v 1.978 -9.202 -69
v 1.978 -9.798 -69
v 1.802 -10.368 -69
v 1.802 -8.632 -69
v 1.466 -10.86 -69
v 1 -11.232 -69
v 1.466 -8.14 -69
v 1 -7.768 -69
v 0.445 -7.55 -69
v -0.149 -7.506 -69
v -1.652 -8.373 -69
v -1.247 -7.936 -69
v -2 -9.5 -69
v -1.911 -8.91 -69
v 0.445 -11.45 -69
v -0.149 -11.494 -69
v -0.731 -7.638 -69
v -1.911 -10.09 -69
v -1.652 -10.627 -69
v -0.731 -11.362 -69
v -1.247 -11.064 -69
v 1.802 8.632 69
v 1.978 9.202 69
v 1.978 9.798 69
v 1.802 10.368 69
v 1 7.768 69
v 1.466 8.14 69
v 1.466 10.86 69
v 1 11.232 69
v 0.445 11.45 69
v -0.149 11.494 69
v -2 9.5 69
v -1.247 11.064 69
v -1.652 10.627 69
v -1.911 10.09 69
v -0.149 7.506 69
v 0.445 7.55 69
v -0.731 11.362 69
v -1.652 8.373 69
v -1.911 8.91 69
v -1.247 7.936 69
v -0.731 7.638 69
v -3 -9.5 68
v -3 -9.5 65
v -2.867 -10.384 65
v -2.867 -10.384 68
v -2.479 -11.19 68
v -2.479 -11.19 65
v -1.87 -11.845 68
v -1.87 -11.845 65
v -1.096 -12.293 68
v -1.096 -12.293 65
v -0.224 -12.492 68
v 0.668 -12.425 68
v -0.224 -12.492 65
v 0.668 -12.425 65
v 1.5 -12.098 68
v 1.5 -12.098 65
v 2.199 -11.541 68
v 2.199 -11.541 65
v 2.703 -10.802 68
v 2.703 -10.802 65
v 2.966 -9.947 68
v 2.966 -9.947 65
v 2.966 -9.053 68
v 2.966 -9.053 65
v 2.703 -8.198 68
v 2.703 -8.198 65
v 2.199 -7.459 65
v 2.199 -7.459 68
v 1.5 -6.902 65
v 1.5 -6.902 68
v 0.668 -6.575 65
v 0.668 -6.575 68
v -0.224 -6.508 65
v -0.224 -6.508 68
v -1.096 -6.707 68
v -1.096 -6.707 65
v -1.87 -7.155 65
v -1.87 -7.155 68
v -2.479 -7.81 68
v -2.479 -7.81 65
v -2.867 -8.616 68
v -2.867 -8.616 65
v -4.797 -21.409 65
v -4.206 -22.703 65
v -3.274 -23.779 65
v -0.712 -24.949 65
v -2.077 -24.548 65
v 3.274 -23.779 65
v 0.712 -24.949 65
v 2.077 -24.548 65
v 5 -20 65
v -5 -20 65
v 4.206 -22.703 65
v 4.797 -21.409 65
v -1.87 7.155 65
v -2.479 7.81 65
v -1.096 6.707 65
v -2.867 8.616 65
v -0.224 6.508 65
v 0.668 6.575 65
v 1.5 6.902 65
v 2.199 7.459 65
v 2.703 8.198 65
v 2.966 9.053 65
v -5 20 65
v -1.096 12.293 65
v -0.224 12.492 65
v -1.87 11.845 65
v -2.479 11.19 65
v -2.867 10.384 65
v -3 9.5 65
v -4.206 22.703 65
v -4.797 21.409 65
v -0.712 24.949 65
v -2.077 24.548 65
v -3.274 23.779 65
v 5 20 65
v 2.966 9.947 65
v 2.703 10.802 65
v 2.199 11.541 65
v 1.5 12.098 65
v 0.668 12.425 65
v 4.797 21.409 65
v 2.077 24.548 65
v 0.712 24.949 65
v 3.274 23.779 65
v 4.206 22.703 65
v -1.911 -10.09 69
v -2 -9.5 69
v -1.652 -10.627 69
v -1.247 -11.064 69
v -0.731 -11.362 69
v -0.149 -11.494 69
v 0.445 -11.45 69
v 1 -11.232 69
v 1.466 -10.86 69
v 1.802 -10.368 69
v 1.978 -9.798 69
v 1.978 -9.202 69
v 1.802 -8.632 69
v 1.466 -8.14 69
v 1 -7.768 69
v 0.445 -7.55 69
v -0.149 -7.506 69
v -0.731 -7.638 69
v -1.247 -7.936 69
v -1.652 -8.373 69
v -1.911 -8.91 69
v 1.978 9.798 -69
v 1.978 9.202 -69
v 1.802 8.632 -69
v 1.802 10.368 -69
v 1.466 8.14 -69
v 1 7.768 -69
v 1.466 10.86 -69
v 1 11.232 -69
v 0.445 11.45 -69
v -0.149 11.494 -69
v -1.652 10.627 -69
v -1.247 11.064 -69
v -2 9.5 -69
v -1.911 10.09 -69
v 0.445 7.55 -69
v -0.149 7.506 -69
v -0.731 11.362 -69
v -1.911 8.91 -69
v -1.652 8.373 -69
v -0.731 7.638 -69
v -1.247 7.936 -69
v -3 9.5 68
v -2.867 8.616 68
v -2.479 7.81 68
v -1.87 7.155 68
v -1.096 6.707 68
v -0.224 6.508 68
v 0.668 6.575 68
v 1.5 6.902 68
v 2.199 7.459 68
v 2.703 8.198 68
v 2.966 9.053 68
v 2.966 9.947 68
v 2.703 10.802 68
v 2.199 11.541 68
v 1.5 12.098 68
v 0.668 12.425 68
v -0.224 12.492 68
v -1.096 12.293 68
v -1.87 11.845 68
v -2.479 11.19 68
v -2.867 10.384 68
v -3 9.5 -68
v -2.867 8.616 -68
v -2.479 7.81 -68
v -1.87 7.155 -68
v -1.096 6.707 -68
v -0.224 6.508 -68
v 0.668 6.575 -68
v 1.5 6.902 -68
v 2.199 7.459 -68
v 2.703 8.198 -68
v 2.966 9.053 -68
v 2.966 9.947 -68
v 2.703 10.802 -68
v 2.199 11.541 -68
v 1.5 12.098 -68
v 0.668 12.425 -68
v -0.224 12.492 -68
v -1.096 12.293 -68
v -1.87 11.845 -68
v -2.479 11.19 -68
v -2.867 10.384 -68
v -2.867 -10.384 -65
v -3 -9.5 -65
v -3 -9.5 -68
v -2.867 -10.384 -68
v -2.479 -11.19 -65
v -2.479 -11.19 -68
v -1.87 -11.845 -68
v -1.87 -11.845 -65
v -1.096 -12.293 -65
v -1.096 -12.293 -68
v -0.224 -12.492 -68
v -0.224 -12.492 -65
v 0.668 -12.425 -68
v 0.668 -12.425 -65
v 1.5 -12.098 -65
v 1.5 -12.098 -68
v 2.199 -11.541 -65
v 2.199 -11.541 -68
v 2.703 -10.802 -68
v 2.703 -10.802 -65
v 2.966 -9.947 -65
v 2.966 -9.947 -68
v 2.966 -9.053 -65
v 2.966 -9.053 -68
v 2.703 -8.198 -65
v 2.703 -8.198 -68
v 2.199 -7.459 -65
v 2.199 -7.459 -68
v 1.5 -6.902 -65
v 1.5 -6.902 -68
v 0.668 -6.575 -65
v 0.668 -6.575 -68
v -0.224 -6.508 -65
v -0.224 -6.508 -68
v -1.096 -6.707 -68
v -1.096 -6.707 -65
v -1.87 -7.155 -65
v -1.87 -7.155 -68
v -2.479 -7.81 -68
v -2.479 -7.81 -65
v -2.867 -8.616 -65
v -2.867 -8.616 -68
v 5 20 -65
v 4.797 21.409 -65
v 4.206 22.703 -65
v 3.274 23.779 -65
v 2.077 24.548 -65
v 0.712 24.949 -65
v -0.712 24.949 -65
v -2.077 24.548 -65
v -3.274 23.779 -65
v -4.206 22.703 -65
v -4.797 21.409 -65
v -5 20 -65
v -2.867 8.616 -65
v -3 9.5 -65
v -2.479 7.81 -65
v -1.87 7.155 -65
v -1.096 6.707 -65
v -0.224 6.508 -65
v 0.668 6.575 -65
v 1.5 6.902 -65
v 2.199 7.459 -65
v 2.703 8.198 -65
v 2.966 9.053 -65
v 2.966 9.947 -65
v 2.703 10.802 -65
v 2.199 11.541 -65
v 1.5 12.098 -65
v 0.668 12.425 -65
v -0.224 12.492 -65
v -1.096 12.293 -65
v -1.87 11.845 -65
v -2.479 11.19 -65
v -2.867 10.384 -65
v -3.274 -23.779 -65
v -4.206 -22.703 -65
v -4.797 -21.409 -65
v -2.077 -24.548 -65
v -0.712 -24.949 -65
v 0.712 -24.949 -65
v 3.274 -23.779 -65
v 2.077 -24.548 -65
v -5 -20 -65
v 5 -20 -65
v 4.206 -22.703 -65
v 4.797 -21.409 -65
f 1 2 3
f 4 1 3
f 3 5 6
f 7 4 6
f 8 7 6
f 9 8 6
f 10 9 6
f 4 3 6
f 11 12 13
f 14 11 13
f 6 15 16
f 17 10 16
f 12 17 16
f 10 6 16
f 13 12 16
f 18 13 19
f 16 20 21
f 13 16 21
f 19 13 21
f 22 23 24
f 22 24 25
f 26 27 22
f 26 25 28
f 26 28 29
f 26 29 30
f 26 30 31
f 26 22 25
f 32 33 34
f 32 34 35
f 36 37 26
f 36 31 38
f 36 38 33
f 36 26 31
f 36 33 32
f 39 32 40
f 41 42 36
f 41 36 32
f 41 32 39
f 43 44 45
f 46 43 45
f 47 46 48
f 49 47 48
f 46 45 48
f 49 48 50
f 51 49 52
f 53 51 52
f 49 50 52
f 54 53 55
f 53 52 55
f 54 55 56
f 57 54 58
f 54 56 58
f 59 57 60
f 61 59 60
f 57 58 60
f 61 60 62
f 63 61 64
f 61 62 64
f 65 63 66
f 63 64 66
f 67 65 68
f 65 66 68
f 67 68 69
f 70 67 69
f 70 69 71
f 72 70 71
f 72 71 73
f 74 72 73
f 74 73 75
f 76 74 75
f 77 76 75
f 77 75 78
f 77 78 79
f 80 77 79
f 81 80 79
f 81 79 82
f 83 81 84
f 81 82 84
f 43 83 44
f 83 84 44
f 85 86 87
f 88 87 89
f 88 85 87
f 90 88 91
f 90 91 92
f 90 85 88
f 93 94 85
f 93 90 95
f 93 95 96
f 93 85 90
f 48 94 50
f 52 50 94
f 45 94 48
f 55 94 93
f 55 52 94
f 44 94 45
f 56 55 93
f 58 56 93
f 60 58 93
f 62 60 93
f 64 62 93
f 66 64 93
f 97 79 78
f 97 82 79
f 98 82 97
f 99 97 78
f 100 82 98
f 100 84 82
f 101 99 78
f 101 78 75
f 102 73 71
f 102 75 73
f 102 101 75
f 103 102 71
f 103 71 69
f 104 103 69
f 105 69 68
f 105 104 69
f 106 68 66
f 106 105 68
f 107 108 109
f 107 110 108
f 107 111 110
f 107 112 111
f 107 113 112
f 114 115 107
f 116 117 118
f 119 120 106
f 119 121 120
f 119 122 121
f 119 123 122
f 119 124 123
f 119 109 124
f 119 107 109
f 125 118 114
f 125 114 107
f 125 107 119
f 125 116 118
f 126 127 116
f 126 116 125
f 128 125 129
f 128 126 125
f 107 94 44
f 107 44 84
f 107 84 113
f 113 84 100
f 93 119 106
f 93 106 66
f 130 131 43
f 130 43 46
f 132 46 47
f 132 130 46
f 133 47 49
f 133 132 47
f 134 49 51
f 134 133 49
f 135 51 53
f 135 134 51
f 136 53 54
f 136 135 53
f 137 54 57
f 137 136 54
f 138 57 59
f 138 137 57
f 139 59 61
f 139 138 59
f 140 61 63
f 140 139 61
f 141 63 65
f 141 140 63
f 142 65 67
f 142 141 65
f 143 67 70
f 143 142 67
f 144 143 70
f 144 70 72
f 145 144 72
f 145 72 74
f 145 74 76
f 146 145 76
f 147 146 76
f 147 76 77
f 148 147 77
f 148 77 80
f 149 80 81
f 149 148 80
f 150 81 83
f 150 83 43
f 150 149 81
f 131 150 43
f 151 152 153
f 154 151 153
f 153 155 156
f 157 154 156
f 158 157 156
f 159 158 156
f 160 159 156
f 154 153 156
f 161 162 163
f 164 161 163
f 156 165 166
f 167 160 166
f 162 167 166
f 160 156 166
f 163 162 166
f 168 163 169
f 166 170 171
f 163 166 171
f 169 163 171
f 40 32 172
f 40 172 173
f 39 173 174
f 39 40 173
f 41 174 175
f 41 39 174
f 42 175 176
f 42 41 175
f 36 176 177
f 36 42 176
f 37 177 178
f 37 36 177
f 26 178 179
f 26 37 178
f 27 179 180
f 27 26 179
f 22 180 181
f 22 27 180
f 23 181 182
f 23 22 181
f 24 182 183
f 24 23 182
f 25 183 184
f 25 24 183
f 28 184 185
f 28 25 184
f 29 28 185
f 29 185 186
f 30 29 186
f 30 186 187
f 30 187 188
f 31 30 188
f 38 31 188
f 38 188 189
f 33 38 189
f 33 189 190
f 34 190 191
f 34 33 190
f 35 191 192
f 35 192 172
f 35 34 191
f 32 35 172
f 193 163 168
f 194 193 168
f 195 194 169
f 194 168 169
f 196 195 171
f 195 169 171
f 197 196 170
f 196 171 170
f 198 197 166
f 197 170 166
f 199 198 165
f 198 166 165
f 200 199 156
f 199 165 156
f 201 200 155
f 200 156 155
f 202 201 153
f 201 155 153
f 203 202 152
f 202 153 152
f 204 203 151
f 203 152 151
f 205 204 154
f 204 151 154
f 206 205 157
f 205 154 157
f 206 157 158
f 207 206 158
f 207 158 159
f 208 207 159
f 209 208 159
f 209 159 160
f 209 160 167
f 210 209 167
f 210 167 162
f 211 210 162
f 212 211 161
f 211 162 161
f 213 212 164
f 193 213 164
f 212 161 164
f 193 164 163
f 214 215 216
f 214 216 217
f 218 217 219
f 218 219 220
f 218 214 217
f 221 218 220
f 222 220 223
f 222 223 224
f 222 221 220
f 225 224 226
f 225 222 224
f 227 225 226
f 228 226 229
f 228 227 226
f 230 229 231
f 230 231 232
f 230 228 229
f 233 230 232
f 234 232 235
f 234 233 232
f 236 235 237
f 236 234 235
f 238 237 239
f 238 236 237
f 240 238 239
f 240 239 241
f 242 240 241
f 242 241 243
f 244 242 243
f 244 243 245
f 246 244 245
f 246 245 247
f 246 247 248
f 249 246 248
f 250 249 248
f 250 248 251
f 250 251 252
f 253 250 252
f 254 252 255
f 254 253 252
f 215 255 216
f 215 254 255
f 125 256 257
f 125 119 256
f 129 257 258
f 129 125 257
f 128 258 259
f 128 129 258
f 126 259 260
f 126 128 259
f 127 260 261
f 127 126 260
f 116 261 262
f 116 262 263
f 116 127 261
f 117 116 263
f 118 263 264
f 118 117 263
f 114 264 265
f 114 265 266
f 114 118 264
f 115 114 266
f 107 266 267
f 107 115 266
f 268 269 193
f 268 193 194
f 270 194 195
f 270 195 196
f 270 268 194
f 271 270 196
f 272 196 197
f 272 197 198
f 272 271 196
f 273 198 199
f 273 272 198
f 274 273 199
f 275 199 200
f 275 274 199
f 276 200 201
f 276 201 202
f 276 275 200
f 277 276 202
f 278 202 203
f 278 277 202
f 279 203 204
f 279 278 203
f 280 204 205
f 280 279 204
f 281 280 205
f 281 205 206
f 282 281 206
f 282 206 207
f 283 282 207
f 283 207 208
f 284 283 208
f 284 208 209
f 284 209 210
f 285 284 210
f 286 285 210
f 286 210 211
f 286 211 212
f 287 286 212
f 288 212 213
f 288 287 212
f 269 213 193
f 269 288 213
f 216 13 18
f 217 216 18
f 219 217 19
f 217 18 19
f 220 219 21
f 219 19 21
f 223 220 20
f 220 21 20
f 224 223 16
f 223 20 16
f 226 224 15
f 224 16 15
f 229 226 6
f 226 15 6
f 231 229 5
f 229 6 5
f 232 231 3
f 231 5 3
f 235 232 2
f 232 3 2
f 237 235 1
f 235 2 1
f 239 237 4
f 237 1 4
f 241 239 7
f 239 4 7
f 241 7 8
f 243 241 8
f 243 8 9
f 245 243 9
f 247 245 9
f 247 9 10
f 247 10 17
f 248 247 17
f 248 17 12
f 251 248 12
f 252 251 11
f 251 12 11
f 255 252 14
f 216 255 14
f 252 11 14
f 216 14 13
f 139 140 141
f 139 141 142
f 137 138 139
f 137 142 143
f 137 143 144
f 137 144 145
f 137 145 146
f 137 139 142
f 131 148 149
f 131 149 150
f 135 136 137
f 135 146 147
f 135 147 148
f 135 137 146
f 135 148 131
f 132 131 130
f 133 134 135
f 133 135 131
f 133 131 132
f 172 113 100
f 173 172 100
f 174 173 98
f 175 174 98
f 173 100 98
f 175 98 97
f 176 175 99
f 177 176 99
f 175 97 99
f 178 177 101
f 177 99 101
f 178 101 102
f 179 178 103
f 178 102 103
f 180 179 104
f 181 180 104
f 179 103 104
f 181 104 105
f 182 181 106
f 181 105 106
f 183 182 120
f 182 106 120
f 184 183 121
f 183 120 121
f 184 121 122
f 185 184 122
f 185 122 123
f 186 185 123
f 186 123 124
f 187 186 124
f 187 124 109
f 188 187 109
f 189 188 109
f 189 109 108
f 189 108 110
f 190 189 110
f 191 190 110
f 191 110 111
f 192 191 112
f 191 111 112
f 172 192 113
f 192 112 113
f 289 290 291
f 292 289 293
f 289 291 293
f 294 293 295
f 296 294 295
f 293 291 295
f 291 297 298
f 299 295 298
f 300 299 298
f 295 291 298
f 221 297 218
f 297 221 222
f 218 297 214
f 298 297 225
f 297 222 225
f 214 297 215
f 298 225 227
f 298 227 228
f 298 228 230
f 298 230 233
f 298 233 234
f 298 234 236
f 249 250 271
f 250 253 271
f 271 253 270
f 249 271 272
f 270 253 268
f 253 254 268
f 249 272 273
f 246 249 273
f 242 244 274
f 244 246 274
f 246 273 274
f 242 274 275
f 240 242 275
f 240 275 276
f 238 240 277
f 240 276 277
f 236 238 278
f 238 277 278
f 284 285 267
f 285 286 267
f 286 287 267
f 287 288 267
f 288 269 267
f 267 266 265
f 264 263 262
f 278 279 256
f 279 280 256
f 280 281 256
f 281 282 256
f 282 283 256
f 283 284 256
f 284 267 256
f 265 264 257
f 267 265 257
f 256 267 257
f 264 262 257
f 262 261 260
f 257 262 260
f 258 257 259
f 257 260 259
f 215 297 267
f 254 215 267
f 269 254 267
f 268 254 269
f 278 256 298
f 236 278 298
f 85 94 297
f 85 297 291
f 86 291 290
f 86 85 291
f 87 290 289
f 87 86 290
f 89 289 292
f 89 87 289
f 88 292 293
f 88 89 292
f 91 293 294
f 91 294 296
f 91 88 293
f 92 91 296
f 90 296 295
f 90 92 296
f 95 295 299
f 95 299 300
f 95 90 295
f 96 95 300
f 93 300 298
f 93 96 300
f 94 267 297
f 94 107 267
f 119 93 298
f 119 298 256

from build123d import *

# Parameters (mm, degrees)
EXTRUDE_1_DEPTH            = 65
SKETCH_2_R                 = 3
EXTRUDE_2_DEPTH            = 4
CHAMFER_1_SIZE             = 1
CHAMFER_1_OF_MIRROR_1_SIZE = 1


with BuildPart() as part:
    # 草圖1 → 伸長1 (new, symmetric)
    with BuildSketch(Plane.XY):
        with BuildLine():
            Line((-5, 20), (-5, -20))
            ThreePointArc((-5, -20), (0, -25), (5, -20))
            Line((5, -20), (5, 20))
            ThreePointArc((5, 20), (0, 25), (-5, 20))
        make_face()
    extrude(amount=EXTRUDE_1_DEPTH, both=True)

    # 草圖2 → 伸長2 (add)
    with BuildSketch(Plane.XY.offset(65)):
        with Locations(Location((0, 9.5, 0), (0, 0, 180))):
            Circle(SKETCH_2_R)
        with Locations(Location((0, -9.5, 0), (0, 0, 180))):
            Circle(SKETCH_2_R)
    extrude_2 = extrude(amount=EXTRUDE_2_DEPTH)

    # 導角1
    chamfer_1_edges = [part.edges().sort_by_distance(p)[0] for p in [
        (3, 9.5, 69),
        (3, -9.5, 69),
    ]]
    chamfer(chamfer_1_edges, length=CHAMFER_1_SIZE)

    # 鏡射1: 伸長2 across plane
    add(extrude_2.mirror(Plane.XY))

    # 導角1 of 鏡射1
    chamfer_1_of_mirror_1_edges = [part.edges().sort_by_distance(p)[0] for p in [
        (3, 9.5, -69),
        (3, -9.5, -69),
    ]]
    chamfer(chamfer_1_of_mirror_1_edges, length=CHAMFER_1_OF_MIRROR_1_SIZE)


solid = part.part
